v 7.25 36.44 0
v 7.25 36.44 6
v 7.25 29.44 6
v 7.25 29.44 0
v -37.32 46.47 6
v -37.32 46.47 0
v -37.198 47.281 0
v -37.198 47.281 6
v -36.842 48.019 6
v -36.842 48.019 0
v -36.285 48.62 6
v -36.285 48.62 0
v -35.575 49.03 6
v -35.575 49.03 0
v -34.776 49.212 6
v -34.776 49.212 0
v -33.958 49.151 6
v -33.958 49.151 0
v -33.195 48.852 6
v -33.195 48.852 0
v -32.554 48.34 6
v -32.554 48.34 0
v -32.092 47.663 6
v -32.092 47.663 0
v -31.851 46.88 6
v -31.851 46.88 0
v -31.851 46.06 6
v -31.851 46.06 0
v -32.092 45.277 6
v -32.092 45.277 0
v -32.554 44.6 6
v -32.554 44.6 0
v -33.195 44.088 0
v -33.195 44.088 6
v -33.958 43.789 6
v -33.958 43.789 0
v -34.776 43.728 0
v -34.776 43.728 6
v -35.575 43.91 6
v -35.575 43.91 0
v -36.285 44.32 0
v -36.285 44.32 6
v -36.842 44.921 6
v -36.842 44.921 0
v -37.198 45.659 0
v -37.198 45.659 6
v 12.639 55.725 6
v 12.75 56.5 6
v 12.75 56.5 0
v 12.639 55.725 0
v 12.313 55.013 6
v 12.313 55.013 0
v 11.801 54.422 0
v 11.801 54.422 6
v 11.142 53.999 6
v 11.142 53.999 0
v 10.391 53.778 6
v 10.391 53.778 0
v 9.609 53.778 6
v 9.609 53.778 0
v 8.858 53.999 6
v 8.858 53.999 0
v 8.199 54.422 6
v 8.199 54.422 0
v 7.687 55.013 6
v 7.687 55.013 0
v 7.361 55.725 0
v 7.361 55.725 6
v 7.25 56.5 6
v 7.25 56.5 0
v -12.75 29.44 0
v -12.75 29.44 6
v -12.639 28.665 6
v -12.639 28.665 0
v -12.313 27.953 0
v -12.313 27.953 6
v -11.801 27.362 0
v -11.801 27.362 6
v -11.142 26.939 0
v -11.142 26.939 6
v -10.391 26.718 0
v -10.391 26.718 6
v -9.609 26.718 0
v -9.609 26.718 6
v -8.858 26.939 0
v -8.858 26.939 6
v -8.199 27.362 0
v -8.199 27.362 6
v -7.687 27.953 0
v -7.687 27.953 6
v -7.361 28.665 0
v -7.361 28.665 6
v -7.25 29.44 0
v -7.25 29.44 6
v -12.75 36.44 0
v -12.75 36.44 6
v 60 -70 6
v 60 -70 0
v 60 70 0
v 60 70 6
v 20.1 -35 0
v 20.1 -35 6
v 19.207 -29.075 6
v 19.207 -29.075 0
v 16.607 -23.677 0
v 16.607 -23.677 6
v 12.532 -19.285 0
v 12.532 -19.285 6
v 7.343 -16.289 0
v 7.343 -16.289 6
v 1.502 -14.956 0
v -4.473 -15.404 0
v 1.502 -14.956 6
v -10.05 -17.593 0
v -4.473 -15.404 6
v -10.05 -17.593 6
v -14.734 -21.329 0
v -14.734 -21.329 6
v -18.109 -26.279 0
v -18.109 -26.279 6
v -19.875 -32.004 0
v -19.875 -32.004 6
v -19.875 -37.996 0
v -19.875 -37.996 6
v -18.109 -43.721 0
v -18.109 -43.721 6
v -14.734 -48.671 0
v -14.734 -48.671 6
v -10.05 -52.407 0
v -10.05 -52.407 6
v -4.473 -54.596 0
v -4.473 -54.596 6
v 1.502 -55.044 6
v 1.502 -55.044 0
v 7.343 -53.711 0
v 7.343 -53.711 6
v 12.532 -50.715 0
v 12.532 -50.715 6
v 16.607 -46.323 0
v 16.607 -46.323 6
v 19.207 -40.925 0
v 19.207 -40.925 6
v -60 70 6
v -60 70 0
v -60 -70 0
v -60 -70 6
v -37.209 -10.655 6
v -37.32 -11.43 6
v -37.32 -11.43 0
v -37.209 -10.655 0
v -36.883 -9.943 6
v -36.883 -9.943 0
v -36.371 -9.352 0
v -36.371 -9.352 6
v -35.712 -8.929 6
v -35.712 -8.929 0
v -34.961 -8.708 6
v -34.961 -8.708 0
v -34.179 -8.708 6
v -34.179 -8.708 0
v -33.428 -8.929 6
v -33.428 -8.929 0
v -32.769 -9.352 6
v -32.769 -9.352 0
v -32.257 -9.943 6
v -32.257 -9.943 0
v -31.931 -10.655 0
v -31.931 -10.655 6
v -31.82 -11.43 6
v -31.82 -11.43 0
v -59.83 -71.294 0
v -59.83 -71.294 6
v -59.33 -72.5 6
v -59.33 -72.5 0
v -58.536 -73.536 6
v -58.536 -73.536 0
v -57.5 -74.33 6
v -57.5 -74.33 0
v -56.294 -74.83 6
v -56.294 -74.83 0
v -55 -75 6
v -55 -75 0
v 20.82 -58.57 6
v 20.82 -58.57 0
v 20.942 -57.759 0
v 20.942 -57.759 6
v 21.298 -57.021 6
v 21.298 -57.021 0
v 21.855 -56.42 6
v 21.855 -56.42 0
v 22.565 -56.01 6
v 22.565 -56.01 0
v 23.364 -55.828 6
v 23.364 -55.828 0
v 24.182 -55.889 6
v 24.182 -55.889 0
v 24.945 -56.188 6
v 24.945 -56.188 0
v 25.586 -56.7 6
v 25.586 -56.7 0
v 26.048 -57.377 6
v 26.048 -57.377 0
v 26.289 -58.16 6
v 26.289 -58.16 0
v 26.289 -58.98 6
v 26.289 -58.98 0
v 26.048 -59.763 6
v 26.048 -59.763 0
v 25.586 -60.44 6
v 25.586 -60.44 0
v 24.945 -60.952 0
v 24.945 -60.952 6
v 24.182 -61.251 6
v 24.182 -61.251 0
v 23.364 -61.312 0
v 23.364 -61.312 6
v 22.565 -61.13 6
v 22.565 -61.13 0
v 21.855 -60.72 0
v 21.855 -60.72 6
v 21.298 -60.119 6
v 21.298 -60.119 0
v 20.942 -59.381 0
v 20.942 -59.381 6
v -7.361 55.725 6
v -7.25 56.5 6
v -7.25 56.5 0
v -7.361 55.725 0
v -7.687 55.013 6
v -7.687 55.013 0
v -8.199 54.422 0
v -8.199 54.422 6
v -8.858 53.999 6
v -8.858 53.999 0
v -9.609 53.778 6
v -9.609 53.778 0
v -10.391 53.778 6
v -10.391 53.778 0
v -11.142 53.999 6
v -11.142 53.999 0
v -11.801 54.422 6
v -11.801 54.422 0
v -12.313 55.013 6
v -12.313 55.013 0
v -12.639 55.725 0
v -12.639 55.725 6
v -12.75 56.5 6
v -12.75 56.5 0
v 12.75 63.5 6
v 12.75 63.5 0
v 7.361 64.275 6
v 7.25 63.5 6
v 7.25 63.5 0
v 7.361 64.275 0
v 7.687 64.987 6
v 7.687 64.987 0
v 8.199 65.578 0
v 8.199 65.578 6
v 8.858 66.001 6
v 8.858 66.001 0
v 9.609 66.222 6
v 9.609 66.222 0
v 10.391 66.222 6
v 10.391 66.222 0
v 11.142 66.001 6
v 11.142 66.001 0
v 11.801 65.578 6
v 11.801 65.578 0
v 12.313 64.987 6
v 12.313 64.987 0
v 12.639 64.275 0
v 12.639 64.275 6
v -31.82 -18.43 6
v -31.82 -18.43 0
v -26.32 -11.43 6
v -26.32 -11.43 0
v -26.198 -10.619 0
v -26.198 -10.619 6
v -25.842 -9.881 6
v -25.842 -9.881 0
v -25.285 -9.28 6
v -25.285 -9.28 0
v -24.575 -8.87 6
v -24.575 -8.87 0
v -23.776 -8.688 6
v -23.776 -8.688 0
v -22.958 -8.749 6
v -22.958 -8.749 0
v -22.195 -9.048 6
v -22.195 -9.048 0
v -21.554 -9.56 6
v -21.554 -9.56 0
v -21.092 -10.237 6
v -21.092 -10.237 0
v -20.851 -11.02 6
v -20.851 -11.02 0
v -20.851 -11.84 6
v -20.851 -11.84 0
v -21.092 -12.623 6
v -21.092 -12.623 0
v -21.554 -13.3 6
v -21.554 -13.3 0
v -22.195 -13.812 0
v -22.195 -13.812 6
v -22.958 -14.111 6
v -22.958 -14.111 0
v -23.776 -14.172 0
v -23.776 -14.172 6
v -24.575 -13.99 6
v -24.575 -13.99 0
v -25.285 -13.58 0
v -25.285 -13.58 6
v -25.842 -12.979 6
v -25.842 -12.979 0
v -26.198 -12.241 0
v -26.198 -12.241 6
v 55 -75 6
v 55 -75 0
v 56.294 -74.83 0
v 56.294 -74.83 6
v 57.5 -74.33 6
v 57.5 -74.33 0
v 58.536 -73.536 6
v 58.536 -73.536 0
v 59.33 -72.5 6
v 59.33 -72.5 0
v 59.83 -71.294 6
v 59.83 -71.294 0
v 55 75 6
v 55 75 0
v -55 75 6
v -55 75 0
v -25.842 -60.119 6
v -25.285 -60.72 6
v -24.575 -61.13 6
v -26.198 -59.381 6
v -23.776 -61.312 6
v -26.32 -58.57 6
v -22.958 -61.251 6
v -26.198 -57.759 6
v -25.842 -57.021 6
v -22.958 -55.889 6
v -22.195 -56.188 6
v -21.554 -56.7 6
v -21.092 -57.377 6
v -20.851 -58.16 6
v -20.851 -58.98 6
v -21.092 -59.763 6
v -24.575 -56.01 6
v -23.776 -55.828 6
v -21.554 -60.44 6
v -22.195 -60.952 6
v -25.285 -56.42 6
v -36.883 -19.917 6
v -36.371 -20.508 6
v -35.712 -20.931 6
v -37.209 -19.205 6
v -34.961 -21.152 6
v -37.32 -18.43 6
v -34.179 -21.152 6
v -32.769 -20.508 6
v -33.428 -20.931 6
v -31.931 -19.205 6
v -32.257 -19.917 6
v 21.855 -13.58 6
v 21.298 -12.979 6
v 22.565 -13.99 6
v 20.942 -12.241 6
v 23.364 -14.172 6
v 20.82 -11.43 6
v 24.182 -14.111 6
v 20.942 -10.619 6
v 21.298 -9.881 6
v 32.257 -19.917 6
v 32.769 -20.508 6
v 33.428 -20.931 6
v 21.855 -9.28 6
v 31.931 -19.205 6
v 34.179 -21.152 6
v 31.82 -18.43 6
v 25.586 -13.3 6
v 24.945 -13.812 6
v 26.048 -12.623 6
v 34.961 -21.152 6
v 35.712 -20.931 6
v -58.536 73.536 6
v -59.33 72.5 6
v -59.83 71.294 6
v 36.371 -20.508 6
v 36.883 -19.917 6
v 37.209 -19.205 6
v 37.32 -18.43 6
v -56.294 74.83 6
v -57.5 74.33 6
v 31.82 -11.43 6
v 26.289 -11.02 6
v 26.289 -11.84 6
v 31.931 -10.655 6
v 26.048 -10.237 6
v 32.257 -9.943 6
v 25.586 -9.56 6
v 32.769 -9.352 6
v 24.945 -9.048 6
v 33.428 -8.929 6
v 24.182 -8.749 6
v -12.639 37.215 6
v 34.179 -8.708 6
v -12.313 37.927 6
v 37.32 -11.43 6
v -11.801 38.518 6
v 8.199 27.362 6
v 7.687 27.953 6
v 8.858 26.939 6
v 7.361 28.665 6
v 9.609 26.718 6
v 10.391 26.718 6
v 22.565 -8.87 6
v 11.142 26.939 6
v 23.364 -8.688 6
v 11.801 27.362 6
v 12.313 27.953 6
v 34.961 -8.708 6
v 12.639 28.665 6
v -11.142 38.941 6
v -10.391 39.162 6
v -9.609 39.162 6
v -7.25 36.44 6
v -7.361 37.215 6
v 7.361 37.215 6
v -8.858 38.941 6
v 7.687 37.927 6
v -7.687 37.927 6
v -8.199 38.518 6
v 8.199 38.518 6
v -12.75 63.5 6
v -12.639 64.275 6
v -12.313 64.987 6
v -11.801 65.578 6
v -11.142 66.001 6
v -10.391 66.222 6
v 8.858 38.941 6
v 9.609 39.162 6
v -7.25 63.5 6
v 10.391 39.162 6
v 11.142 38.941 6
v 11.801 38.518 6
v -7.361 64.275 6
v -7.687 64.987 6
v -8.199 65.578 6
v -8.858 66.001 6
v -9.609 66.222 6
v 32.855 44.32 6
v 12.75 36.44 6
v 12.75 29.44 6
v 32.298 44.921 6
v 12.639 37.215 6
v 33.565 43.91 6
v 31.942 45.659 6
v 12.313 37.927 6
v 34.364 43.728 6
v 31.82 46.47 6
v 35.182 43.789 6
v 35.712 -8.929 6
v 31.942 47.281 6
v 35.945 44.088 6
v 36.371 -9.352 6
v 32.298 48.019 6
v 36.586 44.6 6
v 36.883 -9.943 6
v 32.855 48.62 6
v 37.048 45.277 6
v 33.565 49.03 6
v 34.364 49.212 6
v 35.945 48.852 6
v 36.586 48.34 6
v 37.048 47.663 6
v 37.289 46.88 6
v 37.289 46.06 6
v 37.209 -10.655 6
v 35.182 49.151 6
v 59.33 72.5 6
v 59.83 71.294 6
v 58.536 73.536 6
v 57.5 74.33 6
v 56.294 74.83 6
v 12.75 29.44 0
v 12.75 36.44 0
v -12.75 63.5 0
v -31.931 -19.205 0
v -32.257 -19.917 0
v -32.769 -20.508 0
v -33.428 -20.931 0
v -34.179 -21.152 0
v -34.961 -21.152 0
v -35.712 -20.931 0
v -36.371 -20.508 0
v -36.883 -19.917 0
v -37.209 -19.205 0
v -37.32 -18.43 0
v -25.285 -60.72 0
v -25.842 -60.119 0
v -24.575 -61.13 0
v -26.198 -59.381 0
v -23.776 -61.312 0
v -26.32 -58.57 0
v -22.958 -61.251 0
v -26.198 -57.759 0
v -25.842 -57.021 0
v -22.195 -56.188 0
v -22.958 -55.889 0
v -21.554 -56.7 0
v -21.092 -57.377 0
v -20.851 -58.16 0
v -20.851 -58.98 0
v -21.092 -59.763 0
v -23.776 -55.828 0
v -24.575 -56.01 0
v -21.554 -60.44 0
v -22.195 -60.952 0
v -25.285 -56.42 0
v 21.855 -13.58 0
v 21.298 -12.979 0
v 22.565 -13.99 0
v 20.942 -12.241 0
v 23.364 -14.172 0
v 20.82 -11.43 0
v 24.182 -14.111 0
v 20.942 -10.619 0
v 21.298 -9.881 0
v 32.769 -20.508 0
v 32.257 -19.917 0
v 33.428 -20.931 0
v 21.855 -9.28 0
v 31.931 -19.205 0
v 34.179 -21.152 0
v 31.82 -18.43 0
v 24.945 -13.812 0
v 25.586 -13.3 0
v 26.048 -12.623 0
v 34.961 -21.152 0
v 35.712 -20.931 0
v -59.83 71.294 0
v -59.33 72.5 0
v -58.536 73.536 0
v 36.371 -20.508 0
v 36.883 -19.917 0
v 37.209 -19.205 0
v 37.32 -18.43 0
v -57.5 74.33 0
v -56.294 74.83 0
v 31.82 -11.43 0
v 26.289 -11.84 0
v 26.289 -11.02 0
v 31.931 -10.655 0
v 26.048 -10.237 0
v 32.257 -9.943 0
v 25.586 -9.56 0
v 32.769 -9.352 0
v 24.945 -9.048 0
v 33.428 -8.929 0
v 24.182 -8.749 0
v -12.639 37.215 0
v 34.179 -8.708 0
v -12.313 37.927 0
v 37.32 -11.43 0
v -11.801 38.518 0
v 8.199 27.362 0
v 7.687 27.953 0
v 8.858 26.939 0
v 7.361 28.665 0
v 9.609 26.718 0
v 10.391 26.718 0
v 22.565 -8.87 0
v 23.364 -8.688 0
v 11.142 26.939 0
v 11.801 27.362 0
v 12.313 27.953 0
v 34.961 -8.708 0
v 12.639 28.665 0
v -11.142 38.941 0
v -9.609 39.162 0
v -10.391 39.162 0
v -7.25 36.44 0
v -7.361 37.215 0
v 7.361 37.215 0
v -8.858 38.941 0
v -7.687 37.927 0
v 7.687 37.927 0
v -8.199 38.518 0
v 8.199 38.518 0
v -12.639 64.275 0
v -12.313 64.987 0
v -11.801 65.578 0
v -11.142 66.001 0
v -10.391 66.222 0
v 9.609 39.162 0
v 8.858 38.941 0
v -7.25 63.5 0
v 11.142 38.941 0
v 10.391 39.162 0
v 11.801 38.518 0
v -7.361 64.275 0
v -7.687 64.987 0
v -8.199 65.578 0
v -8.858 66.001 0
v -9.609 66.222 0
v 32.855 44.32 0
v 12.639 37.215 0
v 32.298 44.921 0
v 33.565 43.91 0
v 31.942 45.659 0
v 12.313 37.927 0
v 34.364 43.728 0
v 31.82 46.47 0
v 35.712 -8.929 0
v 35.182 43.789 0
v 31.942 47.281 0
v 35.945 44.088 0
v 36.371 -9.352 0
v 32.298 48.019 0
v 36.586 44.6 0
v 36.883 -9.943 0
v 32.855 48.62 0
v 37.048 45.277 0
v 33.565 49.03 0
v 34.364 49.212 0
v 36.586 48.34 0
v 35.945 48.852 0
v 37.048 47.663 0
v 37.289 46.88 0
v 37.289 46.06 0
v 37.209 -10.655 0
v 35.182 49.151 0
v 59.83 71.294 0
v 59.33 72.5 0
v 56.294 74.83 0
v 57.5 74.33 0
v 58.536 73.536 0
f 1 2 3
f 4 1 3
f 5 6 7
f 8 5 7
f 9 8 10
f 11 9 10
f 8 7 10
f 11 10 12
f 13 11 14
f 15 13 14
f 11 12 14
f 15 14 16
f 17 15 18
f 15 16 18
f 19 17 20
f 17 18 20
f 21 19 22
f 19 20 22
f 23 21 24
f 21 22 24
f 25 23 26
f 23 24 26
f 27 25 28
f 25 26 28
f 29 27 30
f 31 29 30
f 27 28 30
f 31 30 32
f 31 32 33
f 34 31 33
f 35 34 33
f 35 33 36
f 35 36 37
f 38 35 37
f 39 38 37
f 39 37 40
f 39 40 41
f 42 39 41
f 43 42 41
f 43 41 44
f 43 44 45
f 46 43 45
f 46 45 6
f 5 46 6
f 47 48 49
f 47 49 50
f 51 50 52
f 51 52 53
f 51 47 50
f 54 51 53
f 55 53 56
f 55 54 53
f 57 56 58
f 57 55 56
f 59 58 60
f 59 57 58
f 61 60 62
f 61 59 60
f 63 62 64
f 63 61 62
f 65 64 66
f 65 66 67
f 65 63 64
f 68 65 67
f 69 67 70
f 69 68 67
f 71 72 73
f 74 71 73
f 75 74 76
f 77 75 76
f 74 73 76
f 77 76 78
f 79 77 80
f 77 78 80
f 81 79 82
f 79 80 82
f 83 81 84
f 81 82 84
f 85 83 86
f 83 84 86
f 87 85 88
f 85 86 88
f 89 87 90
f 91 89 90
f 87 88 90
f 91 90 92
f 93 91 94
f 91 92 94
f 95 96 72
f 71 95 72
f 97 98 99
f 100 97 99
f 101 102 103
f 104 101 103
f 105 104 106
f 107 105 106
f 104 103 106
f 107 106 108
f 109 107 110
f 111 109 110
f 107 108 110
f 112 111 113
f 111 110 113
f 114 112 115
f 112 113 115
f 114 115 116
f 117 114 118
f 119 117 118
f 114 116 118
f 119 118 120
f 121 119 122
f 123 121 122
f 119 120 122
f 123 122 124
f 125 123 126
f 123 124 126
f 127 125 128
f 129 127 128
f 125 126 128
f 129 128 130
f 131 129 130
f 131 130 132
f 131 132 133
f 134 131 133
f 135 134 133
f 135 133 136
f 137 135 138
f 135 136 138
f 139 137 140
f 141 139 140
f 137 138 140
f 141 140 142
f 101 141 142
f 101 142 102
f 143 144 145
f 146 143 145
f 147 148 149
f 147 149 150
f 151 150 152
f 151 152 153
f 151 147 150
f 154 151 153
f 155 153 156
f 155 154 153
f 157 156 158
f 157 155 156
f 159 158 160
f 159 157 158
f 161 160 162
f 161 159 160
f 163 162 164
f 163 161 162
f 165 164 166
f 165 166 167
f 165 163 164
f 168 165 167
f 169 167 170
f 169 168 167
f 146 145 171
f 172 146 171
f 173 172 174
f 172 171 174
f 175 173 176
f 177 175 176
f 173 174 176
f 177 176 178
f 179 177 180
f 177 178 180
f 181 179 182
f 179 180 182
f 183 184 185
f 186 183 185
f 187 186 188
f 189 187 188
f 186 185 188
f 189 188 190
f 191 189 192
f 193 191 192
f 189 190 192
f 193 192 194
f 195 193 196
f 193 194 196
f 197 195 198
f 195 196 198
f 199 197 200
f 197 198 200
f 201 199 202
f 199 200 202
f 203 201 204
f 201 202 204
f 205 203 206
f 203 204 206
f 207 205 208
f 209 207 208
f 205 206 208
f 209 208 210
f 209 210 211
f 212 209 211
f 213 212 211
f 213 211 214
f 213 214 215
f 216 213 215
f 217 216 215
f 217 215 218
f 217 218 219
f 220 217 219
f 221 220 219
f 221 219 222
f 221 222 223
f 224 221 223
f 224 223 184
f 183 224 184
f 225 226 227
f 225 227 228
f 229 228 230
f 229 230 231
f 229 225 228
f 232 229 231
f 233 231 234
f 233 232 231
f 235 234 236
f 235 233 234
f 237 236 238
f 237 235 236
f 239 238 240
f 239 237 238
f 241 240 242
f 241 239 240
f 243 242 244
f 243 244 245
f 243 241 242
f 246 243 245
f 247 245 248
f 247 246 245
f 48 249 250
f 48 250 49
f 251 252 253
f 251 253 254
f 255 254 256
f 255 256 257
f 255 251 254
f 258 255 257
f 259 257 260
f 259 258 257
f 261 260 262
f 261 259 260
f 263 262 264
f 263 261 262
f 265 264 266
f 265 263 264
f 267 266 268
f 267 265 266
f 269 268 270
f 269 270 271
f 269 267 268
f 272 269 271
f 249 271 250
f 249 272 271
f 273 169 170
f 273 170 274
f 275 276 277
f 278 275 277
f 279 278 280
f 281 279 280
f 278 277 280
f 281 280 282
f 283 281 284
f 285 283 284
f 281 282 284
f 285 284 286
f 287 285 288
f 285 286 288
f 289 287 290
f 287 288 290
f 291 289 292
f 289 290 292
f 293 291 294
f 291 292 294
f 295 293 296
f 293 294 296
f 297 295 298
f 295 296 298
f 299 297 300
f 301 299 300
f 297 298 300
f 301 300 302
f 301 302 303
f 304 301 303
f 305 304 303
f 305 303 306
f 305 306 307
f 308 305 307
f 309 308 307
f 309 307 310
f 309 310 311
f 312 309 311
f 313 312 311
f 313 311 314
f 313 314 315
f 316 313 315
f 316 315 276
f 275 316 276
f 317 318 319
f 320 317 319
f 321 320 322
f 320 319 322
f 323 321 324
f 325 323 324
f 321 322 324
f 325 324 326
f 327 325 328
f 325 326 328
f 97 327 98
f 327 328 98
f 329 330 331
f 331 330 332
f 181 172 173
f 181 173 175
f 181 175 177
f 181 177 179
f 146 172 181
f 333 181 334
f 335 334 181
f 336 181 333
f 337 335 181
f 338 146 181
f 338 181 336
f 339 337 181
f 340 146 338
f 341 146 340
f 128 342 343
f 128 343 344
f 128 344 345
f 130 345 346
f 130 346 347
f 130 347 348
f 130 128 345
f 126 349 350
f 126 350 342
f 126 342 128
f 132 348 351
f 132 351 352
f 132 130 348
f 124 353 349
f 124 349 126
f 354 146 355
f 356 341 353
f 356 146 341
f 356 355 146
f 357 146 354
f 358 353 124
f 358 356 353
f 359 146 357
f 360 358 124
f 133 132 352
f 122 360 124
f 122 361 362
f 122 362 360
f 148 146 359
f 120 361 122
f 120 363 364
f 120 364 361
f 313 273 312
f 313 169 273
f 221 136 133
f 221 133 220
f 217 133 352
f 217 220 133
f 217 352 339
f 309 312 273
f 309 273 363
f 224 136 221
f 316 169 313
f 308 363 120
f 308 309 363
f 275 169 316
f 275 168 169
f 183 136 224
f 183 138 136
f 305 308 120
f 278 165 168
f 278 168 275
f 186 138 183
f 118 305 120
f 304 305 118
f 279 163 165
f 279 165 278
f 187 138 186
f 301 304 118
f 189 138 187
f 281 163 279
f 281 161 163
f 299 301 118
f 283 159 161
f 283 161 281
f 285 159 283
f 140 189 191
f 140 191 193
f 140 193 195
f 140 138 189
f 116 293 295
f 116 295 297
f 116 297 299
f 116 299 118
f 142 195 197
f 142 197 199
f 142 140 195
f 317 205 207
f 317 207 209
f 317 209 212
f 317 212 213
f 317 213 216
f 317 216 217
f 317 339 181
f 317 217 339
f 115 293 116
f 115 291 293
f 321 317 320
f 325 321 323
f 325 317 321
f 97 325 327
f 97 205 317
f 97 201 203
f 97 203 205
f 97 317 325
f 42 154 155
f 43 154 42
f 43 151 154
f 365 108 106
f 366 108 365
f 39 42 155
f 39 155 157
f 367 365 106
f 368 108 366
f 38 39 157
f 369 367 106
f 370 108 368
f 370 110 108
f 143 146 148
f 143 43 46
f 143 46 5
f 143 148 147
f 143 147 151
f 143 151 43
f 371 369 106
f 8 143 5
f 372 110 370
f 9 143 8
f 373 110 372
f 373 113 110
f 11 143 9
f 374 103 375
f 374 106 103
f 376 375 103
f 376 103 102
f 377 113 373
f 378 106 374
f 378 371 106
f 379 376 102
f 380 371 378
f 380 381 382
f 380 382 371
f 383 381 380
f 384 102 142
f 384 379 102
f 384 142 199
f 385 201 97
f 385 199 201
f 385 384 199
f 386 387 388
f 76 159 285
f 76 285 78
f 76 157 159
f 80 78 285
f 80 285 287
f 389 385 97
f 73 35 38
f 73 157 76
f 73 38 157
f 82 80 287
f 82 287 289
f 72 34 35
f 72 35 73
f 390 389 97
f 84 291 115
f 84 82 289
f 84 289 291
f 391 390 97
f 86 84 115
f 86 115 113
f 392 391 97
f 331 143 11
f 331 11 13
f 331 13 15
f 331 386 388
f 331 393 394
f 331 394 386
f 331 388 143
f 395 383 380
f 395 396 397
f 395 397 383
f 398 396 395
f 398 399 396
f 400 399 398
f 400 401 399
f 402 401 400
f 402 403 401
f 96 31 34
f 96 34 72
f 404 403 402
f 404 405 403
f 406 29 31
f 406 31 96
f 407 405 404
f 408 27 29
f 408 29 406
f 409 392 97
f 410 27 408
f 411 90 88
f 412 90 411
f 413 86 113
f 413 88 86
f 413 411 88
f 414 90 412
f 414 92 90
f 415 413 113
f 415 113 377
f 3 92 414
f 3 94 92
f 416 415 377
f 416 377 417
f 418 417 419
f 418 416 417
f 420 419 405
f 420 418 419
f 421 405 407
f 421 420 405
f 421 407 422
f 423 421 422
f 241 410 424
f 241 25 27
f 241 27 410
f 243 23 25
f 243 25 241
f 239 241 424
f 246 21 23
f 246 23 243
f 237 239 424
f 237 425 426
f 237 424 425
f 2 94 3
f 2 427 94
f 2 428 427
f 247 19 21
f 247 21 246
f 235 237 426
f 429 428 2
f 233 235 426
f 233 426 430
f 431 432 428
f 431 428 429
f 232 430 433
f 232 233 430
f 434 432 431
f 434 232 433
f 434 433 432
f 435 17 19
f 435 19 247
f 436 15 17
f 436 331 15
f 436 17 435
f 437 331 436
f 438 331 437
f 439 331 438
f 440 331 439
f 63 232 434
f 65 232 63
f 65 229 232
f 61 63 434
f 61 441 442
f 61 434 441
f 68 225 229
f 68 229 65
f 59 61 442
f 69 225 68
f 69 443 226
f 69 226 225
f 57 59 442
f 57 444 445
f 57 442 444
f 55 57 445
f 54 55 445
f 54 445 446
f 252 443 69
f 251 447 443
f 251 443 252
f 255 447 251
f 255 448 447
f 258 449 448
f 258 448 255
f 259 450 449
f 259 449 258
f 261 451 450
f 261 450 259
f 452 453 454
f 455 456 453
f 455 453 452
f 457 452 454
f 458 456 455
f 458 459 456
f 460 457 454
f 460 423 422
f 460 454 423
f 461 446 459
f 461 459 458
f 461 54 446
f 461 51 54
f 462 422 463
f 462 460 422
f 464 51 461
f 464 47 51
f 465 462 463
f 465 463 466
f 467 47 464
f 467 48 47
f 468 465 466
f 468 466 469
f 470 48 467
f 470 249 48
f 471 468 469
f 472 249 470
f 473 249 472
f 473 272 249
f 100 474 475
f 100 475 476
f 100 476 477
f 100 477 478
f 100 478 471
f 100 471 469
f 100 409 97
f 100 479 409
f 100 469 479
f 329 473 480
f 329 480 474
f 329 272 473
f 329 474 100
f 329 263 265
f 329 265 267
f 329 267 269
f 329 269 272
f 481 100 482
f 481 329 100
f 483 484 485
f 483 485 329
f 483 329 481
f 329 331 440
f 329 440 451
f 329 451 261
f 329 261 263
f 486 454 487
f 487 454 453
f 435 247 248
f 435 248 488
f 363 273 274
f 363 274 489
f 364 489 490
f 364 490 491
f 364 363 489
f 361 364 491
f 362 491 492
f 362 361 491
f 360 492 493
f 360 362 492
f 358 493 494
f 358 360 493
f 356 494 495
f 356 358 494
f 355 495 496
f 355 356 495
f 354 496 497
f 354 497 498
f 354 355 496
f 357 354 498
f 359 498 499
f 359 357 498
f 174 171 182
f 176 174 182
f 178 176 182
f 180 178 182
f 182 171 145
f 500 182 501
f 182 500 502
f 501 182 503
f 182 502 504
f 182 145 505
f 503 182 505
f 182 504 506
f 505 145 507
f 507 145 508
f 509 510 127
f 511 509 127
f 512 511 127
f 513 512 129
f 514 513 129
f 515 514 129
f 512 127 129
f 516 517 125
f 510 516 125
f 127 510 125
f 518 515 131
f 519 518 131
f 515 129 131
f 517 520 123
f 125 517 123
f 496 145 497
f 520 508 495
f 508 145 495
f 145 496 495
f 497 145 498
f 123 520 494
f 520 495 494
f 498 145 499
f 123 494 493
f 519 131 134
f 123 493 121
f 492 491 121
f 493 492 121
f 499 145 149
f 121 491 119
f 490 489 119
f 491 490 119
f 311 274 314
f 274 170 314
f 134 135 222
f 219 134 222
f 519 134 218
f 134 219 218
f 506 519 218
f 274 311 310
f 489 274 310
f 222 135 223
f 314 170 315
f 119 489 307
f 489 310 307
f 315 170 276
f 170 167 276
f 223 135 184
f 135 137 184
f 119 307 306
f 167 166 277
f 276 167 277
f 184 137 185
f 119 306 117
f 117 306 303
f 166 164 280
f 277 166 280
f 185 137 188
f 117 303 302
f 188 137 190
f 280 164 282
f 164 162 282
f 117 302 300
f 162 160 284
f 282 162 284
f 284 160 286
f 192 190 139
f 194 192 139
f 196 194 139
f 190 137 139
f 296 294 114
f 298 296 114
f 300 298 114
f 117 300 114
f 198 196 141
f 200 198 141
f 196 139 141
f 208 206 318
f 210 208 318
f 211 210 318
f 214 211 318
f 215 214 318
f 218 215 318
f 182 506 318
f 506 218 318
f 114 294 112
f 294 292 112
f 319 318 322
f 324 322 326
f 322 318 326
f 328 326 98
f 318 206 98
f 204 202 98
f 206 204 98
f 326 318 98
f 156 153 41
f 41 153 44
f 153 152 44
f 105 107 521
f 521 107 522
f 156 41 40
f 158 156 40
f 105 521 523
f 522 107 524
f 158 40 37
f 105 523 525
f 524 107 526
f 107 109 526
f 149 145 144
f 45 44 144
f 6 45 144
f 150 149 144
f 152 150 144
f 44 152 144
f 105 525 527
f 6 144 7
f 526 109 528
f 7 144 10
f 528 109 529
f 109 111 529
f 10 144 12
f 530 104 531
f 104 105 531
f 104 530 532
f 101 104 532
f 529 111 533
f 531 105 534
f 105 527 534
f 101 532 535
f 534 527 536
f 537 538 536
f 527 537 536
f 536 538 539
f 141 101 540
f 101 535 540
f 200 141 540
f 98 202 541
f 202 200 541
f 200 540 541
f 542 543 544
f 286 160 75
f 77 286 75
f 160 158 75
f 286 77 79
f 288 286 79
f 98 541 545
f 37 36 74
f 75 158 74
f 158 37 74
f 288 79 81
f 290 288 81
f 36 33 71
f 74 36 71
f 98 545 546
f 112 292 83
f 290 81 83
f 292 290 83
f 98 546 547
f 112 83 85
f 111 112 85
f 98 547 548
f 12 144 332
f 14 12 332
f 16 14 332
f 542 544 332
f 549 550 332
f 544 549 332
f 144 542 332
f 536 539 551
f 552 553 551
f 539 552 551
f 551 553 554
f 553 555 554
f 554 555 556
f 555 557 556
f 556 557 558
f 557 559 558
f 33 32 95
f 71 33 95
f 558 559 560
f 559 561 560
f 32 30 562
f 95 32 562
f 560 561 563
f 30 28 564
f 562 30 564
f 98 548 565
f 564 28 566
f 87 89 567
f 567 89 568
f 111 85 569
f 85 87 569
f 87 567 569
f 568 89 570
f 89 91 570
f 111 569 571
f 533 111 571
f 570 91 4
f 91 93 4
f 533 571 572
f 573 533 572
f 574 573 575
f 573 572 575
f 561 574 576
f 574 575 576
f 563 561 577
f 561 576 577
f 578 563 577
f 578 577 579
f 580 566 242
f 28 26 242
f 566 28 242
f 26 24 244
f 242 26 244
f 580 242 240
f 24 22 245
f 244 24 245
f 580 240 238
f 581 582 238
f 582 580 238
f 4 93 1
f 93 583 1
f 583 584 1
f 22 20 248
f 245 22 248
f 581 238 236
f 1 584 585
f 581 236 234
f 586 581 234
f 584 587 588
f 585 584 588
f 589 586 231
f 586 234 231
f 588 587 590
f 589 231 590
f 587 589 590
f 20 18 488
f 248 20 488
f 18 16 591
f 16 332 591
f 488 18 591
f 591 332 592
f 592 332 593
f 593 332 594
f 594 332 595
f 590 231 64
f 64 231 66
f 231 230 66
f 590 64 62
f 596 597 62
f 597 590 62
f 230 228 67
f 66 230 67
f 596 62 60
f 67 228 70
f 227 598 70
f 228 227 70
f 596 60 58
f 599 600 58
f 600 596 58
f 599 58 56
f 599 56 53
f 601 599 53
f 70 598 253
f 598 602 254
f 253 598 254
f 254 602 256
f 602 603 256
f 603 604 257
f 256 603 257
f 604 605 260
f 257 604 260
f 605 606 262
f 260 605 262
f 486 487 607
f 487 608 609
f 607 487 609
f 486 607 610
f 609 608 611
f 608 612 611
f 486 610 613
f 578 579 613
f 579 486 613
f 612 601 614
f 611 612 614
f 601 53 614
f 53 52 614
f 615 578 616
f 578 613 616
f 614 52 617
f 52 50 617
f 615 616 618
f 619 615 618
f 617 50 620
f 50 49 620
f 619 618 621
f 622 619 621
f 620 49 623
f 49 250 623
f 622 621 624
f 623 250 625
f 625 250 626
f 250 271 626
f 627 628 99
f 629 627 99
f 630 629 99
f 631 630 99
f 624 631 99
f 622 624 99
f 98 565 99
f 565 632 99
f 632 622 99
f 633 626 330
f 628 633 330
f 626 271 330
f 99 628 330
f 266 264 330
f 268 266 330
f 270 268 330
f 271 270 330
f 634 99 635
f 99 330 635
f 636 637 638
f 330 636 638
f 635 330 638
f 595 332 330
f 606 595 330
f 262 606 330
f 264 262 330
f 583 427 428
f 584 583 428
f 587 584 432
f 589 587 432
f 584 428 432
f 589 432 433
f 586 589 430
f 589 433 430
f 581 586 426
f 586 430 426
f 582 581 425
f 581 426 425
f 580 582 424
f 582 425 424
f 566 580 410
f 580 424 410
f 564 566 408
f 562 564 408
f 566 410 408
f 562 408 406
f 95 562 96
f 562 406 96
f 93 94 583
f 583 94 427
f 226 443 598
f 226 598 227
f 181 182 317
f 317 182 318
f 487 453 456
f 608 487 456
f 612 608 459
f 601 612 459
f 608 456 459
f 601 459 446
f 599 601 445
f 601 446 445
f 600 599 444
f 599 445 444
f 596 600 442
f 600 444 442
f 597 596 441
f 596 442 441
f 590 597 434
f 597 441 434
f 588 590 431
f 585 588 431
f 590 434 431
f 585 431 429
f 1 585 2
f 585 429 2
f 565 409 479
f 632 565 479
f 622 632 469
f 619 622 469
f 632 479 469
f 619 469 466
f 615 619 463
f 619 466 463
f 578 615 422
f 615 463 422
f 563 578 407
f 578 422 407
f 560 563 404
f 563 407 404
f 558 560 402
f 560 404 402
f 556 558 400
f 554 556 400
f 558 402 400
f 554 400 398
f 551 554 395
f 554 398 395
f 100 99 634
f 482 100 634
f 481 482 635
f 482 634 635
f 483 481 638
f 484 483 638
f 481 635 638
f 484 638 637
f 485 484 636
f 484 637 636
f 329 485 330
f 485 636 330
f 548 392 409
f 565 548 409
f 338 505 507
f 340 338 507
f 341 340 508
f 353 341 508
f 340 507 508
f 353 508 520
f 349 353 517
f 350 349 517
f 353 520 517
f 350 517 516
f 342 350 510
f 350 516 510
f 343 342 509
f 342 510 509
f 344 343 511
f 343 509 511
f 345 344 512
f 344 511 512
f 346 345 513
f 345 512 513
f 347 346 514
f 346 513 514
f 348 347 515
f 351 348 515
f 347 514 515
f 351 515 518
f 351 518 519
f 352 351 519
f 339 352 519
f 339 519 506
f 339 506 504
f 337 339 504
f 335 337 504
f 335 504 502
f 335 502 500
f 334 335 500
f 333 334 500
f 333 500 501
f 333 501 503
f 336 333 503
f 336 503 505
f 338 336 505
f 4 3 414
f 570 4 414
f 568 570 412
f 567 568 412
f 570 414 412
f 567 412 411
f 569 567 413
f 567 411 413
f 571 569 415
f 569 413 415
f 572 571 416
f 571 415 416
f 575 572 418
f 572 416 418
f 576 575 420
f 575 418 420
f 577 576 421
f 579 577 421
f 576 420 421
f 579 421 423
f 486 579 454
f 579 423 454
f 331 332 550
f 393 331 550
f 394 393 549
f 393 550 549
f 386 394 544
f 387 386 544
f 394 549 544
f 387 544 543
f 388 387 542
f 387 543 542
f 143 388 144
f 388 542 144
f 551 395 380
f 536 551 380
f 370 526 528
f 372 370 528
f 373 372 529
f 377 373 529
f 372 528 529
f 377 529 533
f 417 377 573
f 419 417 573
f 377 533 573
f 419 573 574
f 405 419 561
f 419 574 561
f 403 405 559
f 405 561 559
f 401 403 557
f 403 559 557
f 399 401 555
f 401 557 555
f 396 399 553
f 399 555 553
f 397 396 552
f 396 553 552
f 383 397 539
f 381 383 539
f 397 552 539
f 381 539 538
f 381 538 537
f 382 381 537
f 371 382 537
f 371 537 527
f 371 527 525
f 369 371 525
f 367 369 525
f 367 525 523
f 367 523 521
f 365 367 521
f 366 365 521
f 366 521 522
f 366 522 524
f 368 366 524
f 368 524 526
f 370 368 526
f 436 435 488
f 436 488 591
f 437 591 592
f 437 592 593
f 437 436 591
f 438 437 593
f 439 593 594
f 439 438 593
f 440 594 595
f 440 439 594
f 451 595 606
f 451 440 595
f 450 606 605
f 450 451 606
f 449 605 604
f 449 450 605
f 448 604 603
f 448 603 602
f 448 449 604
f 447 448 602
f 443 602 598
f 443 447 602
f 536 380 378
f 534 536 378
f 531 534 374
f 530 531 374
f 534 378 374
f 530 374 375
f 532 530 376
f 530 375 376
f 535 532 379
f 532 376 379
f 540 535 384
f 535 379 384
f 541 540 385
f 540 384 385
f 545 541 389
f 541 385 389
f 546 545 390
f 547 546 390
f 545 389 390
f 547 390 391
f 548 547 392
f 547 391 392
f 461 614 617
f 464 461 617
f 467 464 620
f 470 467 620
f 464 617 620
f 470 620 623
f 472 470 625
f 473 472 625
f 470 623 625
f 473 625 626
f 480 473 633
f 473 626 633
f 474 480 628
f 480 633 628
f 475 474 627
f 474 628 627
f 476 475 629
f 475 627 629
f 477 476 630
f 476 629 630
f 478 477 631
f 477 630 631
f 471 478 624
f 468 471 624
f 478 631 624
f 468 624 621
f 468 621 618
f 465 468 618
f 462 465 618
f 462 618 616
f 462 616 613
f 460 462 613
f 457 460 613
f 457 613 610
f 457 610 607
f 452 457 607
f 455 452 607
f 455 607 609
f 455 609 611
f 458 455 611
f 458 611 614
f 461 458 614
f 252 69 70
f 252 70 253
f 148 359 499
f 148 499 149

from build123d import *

# Parameters (mm, degrees)
BOSS_EXTRUDE1_DEPTH  = 6
SKETCH4_R            = 20.1
CUT_EXTRUDE1_DEPTH   = 6
M5_CLEARANCE_HOLE1_D = 5.5
CUT_EXTRUDE2_DEPTH   = 6
M5_CLEARANCE_HOLE2_D = 5.5
CUT_EXTRUDE3_DEPTH   = 6


with BuildPart() as part:
    # Sketch3 → Boss-Extrude1 (new body)
    with BuildSketch(Plane.XY):
        with BuildLine():
            Line((-55, -75), (55, -75))
            ThreePointArc((55, -75), (58.535533906, -73.535533906), (60, -70))
            Line((60, -70), (60, 70))
            ThreePointArc((60, 70), (58.535533906, 73.535533906), (55, 75))
            Line((55, 75), (-55, 75))
            ThreePointArc((-55, 75), (-58.535533906, 73.535533906), (-60, 70))
            Line((-60, 70), (-60, -70))
            ThreePointArc((-60, -70), (-58.535533906, -73.535533906), (-55, -75))
        make_face()
    extrude(amount=BOSS_EXTRUDE1_DEPTH)

    # Sketch4 → Cut-Extrude1 (cut)
    with BuildSketch(Plane.XY.offset(6)):
        with Locations((0, -35)):
            Circle(SKETCH4_R)
    extrude(amount=-CUT_EXTRUDE1_DEPTH, mode=Mode.SUBTRACT)

    # M5 Clearance Hole1 (through all)
    with Locations(Plane.XY.offset(6)):
        with Locations((-23.57, -11.43), (23.57, -11.43), (23.57, -58.57), (-23.57, -58.57)):
            Hole(M5_CLEARANCE_HOLE1_D / 2)

    # Sketch7 → Cut-Extrude2 (cut)
    with BuildSketch(Plane.XY.offset(6)):
        with BuildLine():
            Line((-31.82, -11.43), (-31.82, -18.43))
            ThreePointArc((-31.82, -18.43), (-34.57, -21.18), (-37.32, -18.43))
            Line((-37.32, -18.43), (-37.32, -11.43))
            ThreePointArc((-37.32, -11.43), (-34.57, -8.68), (-31.82, -11.43))
        make_face()
        with BuildLine():
            Line((31.82, -11.43), (31.82, -18.43))
            ThreePointArc((31.82, -18.43), (34.57, -21.18), (37.32, -18.43))
            Line((37.32, -18.43), (37.32, -11.43))
            ThreePointArc((37.32, -11.43), (34.57, -8.68), (31.82, -11.43))
        make_face()
    extrude(amount=-CUT_EXTRUDE2_DEPTH, mode=Mode.SUBTRACT)

    # M5 Clearance Hole2 (through all)
    with Locations(Plane.XY.offset(6)):
        with Locations((-34.57, 46.47), (34.57, 46.47)):
            Hole(M5_CLEARANCE_HOLE2_D / 2)

    # Sketch10 → Cut-Extrude3 (cut)
    with BuildSketch(Plane.XY.offset(6)):
        with BuildLine():
            Line((-7.25, 63.5), (-7.25, 56.5))
            ThreePointArc((-7.25, 56.5), (-10, 53.75), (-12.75, 56.5))
            Line((-12.75, 56.5), (-12.75, 63.5))
            ThreePointArc((-12.75, 63.5), (-10, 66.25), (-7.25, 63.5))
        make_face()
        with BuildLine():
            Line((12.75, 63.5), (12.75, 56.5))
            ThreePointArc((12.75, 56.5), (10, 53.75), (7.25, 56.5))
            Line((7.25, 56.5), (7.25, 63.5))
            ThreePointArc((7.25, 63.5), (10, 66.25), (12.75, 63.5))
        make_face()
        with BuildLine():
            Line((-7.25, 29.44), (-7.25, 36.44))
            ThreePointArc((-7.25, 36.44), (-10, 39.19), (-12.75, 36.44))
            Line((-12.75, 36.44), (-12.75, 29.44))
            ThreePointArc((-12.75, 29.44), (-10, 26.69), (-7.25, 29.44))
        make_face()
        with BuildLine():
            Line((12.75, 29.44), (12.75, 36.44))
            ThreePointArc((12.75, 36.44), (10, 39.19), (7.25, 36.44))
            Line((7.25, 36.44), (7.25, 29.44))
            ThreePointArc((7.25, 29.44), (10, 26.69), (12.75, 29.44))
        make_face()
    extrude(amount=-CUT_EXTRUDE3_DEPTH, mode=Mode.SUBTRACT)


solid = part.part
